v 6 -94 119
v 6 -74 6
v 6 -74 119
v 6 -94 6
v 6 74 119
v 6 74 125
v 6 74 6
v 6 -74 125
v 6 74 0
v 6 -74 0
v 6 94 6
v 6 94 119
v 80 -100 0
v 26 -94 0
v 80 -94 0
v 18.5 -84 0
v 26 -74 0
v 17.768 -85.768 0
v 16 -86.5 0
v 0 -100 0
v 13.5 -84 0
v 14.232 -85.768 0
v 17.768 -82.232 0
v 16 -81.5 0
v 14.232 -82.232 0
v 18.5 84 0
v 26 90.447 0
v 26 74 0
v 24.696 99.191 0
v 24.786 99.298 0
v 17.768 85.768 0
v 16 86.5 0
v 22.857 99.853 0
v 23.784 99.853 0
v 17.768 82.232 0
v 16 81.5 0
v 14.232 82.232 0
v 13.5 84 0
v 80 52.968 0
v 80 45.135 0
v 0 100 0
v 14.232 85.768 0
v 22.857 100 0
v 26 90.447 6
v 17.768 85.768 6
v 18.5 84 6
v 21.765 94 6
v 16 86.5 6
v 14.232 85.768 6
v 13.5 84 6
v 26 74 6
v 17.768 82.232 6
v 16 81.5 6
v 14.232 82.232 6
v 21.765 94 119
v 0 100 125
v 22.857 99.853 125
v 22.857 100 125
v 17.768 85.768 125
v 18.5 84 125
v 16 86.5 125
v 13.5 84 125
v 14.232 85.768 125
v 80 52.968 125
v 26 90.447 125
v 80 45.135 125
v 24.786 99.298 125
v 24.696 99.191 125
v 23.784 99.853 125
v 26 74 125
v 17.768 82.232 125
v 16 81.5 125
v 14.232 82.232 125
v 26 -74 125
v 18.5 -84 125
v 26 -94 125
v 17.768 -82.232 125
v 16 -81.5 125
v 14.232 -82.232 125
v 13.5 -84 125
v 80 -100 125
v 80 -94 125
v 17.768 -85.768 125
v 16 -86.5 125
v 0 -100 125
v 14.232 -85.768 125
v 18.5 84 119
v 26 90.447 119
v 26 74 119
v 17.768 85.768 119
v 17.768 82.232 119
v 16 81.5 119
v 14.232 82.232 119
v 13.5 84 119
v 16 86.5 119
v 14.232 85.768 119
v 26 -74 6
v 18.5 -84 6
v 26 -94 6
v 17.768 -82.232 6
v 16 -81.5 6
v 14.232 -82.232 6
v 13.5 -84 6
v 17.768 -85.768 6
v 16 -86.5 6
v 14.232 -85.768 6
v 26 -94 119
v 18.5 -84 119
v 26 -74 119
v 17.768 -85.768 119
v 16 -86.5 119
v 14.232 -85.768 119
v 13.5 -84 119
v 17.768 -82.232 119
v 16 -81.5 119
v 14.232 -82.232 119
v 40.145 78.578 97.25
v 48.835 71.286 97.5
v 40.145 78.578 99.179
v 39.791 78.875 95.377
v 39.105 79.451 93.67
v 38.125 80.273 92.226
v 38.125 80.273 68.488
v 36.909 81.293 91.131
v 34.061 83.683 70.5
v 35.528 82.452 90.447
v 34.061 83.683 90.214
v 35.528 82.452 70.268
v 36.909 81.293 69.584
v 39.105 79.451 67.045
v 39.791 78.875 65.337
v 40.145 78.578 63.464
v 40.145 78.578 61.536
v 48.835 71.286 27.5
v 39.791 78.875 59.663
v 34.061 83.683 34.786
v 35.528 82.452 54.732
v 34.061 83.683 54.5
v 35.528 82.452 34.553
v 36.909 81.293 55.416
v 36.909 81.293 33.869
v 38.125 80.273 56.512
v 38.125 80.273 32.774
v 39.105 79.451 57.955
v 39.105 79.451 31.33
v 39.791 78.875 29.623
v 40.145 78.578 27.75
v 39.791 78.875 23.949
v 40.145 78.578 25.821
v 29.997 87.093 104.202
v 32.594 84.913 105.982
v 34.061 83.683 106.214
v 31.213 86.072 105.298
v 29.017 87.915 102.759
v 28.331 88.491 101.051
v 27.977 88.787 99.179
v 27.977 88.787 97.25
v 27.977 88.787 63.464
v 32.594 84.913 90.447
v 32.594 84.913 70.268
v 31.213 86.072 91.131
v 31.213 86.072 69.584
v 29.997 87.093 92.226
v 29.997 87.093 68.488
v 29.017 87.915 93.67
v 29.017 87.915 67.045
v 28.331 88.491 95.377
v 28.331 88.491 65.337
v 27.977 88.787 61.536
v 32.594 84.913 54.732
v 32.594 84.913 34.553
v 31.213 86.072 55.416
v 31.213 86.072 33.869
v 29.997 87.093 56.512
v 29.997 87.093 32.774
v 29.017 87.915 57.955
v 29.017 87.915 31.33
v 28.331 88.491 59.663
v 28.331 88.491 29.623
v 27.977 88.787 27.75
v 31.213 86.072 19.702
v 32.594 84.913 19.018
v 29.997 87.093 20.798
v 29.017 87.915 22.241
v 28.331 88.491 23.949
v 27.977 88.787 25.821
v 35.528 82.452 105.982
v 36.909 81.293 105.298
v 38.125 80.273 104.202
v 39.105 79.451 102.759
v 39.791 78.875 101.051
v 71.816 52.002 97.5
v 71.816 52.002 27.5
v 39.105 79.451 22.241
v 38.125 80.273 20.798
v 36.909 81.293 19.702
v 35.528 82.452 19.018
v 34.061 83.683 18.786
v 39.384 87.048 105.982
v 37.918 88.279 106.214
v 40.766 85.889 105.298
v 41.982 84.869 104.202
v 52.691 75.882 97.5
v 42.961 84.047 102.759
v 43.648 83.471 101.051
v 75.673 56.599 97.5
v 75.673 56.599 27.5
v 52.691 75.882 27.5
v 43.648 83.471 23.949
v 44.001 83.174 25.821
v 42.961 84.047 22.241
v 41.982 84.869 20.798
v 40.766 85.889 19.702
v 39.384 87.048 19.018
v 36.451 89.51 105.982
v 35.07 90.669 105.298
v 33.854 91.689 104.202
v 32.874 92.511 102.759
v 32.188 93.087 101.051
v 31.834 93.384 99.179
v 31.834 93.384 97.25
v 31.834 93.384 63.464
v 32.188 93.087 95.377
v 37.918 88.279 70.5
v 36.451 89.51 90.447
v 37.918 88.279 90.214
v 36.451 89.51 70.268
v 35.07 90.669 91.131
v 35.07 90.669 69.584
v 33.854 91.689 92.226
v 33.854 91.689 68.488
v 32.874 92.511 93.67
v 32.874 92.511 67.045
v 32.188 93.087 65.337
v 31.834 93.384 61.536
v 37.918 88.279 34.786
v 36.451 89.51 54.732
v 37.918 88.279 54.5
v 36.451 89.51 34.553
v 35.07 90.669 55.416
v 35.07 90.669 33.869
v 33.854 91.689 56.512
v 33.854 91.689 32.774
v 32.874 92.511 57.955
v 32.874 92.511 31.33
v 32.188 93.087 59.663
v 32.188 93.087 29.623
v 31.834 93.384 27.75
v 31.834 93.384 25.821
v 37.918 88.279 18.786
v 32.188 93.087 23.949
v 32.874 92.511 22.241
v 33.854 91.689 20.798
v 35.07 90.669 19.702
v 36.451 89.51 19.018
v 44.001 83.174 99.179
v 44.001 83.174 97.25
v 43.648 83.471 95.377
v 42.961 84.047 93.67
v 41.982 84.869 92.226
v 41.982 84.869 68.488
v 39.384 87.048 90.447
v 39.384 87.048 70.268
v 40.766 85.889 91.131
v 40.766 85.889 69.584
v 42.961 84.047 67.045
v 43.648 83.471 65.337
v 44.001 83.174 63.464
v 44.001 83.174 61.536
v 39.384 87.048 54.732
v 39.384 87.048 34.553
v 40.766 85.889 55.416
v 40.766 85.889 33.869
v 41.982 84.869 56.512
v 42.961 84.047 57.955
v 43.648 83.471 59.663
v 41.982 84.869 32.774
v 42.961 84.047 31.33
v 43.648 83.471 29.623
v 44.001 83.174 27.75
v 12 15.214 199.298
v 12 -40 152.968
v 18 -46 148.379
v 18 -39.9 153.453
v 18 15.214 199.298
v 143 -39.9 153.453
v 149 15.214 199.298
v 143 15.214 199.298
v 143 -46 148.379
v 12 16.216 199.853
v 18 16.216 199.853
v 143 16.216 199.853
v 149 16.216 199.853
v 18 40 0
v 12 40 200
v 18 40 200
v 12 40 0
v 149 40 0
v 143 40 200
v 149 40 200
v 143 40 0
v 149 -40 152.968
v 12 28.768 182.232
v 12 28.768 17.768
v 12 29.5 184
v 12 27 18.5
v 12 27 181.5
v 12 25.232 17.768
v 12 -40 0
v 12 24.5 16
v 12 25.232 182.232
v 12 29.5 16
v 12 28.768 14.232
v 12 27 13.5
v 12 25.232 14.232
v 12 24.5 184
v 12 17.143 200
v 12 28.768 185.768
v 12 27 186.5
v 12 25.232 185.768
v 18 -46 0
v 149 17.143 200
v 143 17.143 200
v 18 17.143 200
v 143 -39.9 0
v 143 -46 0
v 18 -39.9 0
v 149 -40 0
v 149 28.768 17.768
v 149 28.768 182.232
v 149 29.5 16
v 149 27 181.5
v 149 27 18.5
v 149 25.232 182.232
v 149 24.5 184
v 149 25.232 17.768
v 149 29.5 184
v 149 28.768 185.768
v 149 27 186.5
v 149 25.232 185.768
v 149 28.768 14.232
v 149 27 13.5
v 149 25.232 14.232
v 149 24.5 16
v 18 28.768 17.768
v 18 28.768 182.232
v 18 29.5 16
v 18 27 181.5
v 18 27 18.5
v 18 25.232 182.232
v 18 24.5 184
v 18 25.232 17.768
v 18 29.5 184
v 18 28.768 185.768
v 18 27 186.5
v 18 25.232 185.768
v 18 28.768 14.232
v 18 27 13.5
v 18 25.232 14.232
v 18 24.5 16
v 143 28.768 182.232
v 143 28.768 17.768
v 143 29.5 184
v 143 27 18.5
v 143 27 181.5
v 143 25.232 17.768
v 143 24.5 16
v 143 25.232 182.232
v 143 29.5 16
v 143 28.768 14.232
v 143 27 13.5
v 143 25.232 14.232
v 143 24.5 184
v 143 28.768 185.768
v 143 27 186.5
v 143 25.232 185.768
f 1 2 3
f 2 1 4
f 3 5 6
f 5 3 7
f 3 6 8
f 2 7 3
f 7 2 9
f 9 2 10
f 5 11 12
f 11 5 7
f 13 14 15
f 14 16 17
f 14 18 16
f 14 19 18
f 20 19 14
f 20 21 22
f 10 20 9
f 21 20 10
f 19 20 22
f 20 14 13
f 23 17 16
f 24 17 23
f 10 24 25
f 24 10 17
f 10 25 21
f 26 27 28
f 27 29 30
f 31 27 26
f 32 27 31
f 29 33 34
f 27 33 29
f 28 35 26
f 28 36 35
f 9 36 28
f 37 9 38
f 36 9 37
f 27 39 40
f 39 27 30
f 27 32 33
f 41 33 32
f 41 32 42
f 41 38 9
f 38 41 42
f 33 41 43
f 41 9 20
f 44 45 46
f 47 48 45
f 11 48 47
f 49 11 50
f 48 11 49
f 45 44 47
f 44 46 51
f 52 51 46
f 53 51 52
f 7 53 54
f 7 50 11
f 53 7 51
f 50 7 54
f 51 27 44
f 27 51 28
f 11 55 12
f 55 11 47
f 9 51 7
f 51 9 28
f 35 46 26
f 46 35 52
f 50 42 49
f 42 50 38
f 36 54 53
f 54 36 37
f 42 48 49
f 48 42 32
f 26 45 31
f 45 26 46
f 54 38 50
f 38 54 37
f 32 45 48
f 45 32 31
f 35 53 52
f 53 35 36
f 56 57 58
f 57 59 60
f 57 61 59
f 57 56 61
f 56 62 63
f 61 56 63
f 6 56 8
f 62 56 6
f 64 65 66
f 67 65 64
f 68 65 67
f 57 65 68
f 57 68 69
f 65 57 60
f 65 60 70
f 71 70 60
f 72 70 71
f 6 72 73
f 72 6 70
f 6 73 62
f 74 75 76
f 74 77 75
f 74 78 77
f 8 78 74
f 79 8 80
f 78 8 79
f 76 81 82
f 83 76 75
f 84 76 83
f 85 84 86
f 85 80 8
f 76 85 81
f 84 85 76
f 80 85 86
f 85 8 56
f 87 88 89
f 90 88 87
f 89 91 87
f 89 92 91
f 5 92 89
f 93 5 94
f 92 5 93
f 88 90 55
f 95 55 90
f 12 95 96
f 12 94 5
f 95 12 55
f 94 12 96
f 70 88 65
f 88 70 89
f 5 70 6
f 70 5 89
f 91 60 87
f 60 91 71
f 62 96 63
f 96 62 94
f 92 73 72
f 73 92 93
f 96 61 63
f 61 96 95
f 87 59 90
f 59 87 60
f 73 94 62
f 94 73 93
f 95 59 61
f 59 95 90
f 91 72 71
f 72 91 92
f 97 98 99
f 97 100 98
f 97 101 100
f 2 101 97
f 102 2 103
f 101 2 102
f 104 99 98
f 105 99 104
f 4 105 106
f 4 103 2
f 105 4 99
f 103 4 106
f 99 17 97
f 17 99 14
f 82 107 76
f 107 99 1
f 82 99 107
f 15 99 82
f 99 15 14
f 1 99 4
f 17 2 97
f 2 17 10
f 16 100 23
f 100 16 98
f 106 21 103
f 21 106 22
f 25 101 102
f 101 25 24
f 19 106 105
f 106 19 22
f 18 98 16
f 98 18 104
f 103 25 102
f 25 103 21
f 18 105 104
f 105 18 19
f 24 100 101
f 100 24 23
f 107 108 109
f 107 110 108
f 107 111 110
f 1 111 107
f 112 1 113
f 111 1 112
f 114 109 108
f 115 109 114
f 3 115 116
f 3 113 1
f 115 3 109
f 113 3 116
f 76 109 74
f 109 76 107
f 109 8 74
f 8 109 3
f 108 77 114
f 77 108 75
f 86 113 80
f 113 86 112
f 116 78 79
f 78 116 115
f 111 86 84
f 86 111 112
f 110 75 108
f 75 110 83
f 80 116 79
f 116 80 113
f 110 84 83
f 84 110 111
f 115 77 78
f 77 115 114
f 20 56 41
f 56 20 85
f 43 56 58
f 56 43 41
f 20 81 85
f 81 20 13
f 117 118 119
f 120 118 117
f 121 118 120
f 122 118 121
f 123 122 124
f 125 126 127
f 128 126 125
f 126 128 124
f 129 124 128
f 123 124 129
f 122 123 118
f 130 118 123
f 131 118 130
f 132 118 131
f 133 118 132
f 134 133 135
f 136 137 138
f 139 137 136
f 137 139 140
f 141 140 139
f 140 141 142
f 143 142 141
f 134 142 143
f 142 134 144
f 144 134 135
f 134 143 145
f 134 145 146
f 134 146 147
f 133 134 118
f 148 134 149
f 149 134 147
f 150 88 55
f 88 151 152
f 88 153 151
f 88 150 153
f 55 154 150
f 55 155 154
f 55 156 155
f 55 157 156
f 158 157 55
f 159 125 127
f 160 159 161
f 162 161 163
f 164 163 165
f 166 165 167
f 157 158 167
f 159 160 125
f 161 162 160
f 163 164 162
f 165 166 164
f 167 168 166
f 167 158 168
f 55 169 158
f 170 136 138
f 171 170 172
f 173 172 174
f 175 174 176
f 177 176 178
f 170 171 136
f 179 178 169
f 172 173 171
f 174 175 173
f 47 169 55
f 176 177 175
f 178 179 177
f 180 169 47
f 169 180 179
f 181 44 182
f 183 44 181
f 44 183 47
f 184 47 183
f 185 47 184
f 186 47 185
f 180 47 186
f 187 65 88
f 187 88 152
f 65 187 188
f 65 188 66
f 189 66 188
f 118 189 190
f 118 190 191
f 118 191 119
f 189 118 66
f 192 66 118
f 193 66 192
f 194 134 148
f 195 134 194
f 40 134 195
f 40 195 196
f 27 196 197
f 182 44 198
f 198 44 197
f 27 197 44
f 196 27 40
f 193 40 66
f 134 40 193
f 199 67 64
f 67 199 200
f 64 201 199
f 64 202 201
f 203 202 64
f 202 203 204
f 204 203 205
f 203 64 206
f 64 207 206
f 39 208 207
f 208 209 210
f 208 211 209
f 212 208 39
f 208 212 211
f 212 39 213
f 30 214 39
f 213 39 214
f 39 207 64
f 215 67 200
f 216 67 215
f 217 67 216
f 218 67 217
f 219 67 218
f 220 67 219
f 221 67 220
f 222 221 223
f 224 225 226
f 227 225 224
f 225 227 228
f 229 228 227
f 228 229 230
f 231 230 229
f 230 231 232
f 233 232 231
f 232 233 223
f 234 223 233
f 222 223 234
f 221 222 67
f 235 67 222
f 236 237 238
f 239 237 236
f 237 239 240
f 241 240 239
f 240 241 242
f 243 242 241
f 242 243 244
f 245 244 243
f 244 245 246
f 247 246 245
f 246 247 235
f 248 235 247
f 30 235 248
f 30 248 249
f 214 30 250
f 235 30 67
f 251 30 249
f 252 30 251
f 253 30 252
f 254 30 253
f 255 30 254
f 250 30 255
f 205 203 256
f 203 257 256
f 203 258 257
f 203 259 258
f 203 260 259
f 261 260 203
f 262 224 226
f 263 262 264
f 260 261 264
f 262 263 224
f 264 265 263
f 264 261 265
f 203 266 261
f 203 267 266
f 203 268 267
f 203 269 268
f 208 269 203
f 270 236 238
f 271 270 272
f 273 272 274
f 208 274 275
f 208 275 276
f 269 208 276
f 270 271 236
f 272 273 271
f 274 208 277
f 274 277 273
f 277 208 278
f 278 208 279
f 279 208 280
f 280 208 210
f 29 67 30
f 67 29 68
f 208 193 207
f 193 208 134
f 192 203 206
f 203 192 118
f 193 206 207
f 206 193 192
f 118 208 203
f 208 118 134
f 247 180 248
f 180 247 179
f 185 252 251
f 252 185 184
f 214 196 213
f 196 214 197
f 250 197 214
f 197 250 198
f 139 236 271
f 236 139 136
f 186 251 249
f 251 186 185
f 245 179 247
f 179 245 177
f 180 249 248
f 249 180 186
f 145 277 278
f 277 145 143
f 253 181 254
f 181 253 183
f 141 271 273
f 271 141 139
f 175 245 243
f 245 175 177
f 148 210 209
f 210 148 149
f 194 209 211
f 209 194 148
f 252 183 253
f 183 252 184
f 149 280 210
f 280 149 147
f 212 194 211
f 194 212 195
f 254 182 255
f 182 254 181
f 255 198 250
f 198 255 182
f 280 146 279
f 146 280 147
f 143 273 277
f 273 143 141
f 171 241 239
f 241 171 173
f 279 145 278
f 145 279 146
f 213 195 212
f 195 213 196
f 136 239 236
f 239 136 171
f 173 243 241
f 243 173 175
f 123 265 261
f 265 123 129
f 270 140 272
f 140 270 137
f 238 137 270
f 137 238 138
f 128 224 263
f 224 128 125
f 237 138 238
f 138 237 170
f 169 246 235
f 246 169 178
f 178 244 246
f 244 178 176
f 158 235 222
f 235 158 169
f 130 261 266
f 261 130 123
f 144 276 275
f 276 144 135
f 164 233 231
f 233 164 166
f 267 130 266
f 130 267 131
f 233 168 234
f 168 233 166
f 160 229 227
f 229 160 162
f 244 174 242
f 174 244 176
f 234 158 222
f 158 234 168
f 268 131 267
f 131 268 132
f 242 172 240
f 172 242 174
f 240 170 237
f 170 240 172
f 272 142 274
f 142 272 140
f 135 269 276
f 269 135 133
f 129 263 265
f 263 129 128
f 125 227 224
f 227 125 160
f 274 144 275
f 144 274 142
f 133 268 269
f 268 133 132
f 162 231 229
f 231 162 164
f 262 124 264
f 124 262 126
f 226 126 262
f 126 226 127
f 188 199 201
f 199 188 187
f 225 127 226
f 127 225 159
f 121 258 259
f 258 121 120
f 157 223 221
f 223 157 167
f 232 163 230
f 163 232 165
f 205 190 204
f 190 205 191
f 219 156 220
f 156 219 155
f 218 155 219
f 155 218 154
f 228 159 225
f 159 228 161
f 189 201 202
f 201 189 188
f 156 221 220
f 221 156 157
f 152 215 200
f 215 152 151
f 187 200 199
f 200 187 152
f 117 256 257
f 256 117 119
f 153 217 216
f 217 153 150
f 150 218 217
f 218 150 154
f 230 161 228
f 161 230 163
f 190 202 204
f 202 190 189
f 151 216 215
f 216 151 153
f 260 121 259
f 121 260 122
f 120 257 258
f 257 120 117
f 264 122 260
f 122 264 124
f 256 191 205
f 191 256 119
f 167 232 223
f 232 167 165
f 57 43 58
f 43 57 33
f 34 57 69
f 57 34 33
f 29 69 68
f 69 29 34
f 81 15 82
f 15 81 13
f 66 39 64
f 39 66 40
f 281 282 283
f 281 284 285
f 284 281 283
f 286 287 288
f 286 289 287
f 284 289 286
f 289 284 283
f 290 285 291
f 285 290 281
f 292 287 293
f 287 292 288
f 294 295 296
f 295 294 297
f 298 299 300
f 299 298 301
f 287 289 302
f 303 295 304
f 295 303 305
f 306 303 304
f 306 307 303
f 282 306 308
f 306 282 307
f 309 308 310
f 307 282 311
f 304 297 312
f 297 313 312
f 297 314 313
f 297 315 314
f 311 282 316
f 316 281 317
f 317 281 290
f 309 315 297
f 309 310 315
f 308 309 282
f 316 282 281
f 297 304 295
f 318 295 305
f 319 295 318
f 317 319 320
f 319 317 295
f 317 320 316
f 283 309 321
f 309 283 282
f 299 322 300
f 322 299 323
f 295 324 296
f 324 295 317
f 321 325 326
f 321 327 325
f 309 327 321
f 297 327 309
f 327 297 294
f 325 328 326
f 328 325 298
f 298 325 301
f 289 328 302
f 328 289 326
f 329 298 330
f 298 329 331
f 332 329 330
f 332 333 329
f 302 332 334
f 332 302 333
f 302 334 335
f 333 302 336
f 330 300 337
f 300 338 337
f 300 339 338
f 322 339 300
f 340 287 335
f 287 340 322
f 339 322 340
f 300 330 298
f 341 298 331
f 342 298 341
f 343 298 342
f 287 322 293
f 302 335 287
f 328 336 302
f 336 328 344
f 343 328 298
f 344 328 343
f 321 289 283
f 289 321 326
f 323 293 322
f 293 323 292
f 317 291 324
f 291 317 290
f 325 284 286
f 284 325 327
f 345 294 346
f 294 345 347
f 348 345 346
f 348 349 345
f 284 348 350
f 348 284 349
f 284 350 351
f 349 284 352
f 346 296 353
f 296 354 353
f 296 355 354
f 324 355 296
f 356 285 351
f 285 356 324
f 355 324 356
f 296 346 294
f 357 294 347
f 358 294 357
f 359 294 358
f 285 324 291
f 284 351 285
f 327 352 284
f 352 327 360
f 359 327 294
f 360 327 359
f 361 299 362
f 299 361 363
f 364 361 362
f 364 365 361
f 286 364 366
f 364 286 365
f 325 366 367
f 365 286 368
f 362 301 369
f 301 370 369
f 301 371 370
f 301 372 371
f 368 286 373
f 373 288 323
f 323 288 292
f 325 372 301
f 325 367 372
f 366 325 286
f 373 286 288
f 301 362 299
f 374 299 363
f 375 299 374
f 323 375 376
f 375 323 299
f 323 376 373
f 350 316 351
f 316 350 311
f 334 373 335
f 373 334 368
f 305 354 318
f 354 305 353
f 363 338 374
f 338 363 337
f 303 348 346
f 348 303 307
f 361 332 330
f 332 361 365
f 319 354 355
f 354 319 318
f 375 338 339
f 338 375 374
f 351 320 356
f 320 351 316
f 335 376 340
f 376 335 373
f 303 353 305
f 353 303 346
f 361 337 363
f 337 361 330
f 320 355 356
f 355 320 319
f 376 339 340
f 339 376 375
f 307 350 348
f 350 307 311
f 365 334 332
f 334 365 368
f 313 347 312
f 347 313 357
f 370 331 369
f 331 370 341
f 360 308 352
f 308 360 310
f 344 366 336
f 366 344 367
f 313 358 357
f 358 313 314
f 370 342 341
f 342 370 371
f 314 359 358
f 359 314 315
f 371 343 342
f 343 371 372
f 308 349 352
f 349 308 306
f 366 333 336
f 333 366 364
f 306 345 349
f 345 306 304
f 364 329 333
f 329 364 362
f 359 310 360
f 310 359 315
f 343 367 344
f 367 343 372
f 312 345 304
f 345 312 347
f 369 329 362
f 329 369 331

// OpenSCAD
echo(version=version());


wand_staerke=6;
gehaeuse_breite = 125;
gehaeuse_laenge = 200;
gehaeuse_hoehe = 80;



//unterwand(gehaeuse_breite, gehaeuse_laenge, wand_staerke);

//hinterwand(gehaeuse_breite, gehaeuse_hoehe, wand_staerke);

// forderwand_oben(gehaeuse_breite, gehaeuse_hoehe, wand_staerke);
// forderwand_unten(gehaeuse_breite, gehaeuse_hoehe, gehaeuse_hoehe / 3.5, wand_staerke);
//forderwand(gehaeuse_breite, gehaeuse_hoehe, wand_staerke);

// unterteil(gehaeuse_breite, gehaeuse_laenge, gehaeuse_hoehe, wand_staerke);

// seite(gehaeuse_laenge, gehaeuse_breite, gehaeuse_hoehe, wand_staerke);

//oberteil(gehaeuse_laenge, gehaeuse_breite, gehaeuse_hoehe, wand_staerke);

//ansicht_zusammen(gehaeuse_laenge, gehaeuse_breite, gehaeuse_hoehe, wand_staerke);

ansicht_druck(gehaeuse_laenge, gehaeuse_breite, gehaeuse_hoehe, wand_staerke);


module ansicht_druck(gehaeuse_laenge, gehaeuse_breite, gehaeuse_hoehe, wand_staerke){
  color("red")
    translate([0,0,gehaeuse_breite/2])
      rotate([0,90,0])
        unterteil(gehaeuse_breite, gehaeuse_laenge, gehaeuse_hoehe, wand_staerke);
    
  color("blue")
    translate([gehaeuse_breite / 2 + wand_staerke*3  ,gehaeuse_hoehe / 2,gehaeuse_laenge / 2])
      rotate([90,0,0])
        oberteil(gehaeuse_laenge, gehaeuse_breite, gehaeuse_hoehe, wand_staerke);  
}


module ansicht_zusammen(gehaeuse_laenge, gehaeuse_breite, gehaeuse_hoehe, wand_staerke){
  color("red")
    unterteil(gehaeuse_breite, gehaeuse_laenge, gehaeuse_hoehe, wand_staerke);
  color("blue")
    oberteil(gehaeuse_laenge, gehaeuse_breite, gehaeuse_hoehe, wand_staerke);  
}


module oberteil(gehaeuse_laenge, gehaeuse_breite, gehaeuse_hoehe, wand_staerke){
  difference(){
    hull(){
      translate([gehaeuse_breite / 2 + wand_staerke,0,0])
        seite(gehaeuse_laenge, gehaeuse_breite, gehaeuse_hoehe, wand_staerke);

      mirror([1,0,0])
        translate([gehaeuse_breite / 2 + wand_staerke,0,0])
          seite(gehaeuse_laenge, gehaeuse_breite, gehaeuse_hoehe, wand_staerke);
      
      dach(gehaeuse_laenge, gehaeuse_breite, gehaeuse_hoehe, wand_staerke);
    }
    
    translate([0,0,-0.1])
      scale([1,2,1])
        hull(){
          unterteil(gehaeuse_breite, gehaeuse_laenge, gehaeuse_hoehe, wand_staerke);
        }
    
    // Loch 1
    scale([100,1,1])
      translate([-gehaeuse_breite / 2 +1, 0,0])      
        montage_hilfe_loch(gehaeuse_breite, gehaeuse_laenge, wand_staerke);
    
    // Loch 2
    mirror([0,1,0])
      scale([100,1,1])
        translate([-gehaeuse_breite / 2 +1, 0,0])      
          montage_hilfe_loch(gehaeuse_breite, gehaeuse_laenge, wand_staerke);
  }
}


module dach(gehaeuse_laenge, gehaeuse_breite, gehaeuse_hoehe, wand_staerke){
  translate([0, -wand_staerke /2])
    difference(){
      resize([gehaeuse_breite, gehaeuse_laenge - wand_staerke, gehaeuse_hoehe + wand_staerke])
      hull(){
        unterteil(gehaeuse_breite, gehaeuse_laenge, gehaeuse_hoehe, wand_staerke);
      }
      translate([0,0,gehaeuse_hoehe/2])
        cube([
          gehaeuse_breite+1,
          gehaeuse_laenge +1,
          gehaeuse_hoehe+0.1,
        ], center = true);
    }
}


module seite(gehaeuse_laenge, gehaeuse_breite, gehaeuse_hoehe, wand_staerke){
  rotate([0,-90])
    translate([gehaeuse_hoehe / 2,0,0])
      difference(){
        translate([-gehaeuse_hoehe / 2 , 0, gehaeuse_breite / 2])  
          rotate([0,90,0])
            hull(){
              unterteil(gehaeuse_breite, gehaeuse_laenge, gehaeuse_hoehe, wand_staerke);
            }
        translate([0,0,gehaeuse_breite / 2 + wand_staerke])
          cube([
                gehaeuse_hoehe +1,
                gehaeuse_laenge +1,
                gehaeuse_breite, 
               ], center = true);
      }
}

module forderwand_oben(gehaeuse_breite, gehaeuse_hoehe, wand_staerke){
  display_position_y = gehaeuse_hoehe / 7;
  knopf_position_y = -gehaeuse_hoehe / 3.5;
  knopf_position_x = gehaeuse_breite / 3.5;
  
  rotate([90,0,0])
    translate([0,gehaeuse_hoehe / 2, 0])
      union(){
        difference(){
          cube([
              gehaeuse_breite,
              gehaeuse_hoehe,
              wand_staerke, 
              ], center = true);
          
          translate([0, display_position_y, 0])
            display(wand_staerke+1);
          
          translate([knopf_position_x, knopf_position_y, 0 ])
             knopf(wand_staerke+1);
          
          translate([0, knopf_position_y, 0 ])
            knopf(wand_staerke+1);
          
          translate([-knopf_position_x, knopf_position_y, 0 ])
             knopf(wand_staerke+1);
        }
      }
}

module forderwand_unten(gehaeuse_breite, gehaeuse_hoehe, forderwand_hoehe, wand_staerke){
  rotate([90,0,0])
    translate([0,forderwand_hoehe / 2, 0])
      cube([
        gehaeuse_breite,
        forderwand_hoehe,
        wand_staerke
        ], center = true);
}



module forderwand(gehaeuse_breite, gehaeuse_hoehe, wand_staerke){
  forderwand_hoehe = gehaeuse_hoehe / 3.5;
  union(){
    forderwand_unten(gehaeuse_breite, gehaeuse_hoehe, forderwand_hoehe, wand_staerke);
    translate([0,0,forderwand_hoehe])
      rotate([0,90,0])
        cylinder(gehaeuse_breite, wand_staerke/2, wand_staerke/2, center= true);
    translate([0, 0, forderwand_hoehe])
      rotate([40,0,0])  
        forderwand_oben(gehaeuse_breite, gehaeuse_hoehe, wand_staerke);
  }
}

module hinterwand(gehaeuse_breite, gehaeuse_hoehe, wand_staerke) {
  translate([0,0,gehaeuse_hoehe/2])
    rotate([90,0,0])
      cube([
        gehaeuse_breite,
        gehaeuse_hoehe,
        wand_staerke,
        ], center = true);
}

module unterwand(gehaeuse_breite, gehaeuse_laenge, wand_staerke){
  
  cube([
    gehaeuse_breite,
    gehaeuse_laenge,
    wand_staerke
    ], center = true);
    
  montage_hilfe(gehaeuse_breite, gehaeuse_laenge, wand_staerke);
  mirror([1,0,0])
    montage_hilfe(gehaeuse_breite, gehaeuse_laenge, wand_staerke);
  mirror([0,1,0])
    montage_hilfe(gehaeuse_breite, gehaeuse_laenge, wand_staerke);  
  mirror([0,1,0])
    mirror([1,0,0])
    montage_hilfe(gehaeuse_breite, gehaeuse_laenge, wand_staerke);
}

module unterteil(gehaeuse_breite, gehaeuse_laenge, gehaeuse_hoehe, wand_staerke){ 
  difference(){
    union(){
      translate([0,0,wand_staerke/2])
        unterwand(gehaeuse_breite, gehaeuse_laenge, wand_staerke);
      
      translate([0, -(gehaeuse_laenge - wand_staerke) / 2, 0 ])
        hinterwand(gehaeuse_breite, gehaeuse_hoehe, wand_staerke);
      
      translate([0, (gehaeuse_laenge - wand_staerke) / 2, 0])
        forderwand(gehaeuse_breite, gehaeuse_hoehe, wand_staerke);
    }    
    
    translate([0,0,wand_staerke*4 + gehaeuse_hoehe])
      cube([
        gehaeuse_breite + 1,
        gehaeuse_laenge + 1,
        wand_staerke *8
        ], center= true
      );
  }
}

module montage_hilfe(gehaeuse_breite, gehaeuse_laenge, wand_staerke){
  montage_groesse = gehaeuse_laenge / 10;
  difference(){
    translate([(gehaeuse_breite - wand_staerke) / 2, (gehaeuse_laenge - montage_groesse ) / 2 - wand_staerke , (montage_groesse + wand_staerke) / 2 ])
      rotate([0,90,0])
        cube([
          montage_groesse,
          montage_groesse,
          wand_staerke
          ], center = true);
    montage_hilfe_loch(gehaeuse_breite, gehaeuse_laenge, wand_staerke);
  }
}

module montage_hilfe_loch(gehaeuse_breite, gehaeuse_laenge, wand_staerke){
  loch_radius = 2.5;
  montage_groesse = gehaeuse_laenge / 10;
  translate([(gehaeuse_breite - wand_staerke) / 2, (gehaeuse_laenge - montage_groesse ) / 2 - wand_staerke , (montage_groesse + wand_staerke) / 2 ])
    rotate([0,90,0])
      cylinder(
        wand_staerke +1, 
        loch_radius, 
        loch_radius, 
        center=true);      
}

module display(wand_staerke){
  display_breite = 70;
  display_hoehe = 30;
  
  cube([
    display_breite,
    display_hoehe,
    wand_staerke,         
    ], center = true);
}

module knopf(wand_staerke){  
  knopf_radius = 8;
  cylinder(
    wand_staerke, 
    knopf_radius, 
    knopf_radius, 
    center=true);
}
